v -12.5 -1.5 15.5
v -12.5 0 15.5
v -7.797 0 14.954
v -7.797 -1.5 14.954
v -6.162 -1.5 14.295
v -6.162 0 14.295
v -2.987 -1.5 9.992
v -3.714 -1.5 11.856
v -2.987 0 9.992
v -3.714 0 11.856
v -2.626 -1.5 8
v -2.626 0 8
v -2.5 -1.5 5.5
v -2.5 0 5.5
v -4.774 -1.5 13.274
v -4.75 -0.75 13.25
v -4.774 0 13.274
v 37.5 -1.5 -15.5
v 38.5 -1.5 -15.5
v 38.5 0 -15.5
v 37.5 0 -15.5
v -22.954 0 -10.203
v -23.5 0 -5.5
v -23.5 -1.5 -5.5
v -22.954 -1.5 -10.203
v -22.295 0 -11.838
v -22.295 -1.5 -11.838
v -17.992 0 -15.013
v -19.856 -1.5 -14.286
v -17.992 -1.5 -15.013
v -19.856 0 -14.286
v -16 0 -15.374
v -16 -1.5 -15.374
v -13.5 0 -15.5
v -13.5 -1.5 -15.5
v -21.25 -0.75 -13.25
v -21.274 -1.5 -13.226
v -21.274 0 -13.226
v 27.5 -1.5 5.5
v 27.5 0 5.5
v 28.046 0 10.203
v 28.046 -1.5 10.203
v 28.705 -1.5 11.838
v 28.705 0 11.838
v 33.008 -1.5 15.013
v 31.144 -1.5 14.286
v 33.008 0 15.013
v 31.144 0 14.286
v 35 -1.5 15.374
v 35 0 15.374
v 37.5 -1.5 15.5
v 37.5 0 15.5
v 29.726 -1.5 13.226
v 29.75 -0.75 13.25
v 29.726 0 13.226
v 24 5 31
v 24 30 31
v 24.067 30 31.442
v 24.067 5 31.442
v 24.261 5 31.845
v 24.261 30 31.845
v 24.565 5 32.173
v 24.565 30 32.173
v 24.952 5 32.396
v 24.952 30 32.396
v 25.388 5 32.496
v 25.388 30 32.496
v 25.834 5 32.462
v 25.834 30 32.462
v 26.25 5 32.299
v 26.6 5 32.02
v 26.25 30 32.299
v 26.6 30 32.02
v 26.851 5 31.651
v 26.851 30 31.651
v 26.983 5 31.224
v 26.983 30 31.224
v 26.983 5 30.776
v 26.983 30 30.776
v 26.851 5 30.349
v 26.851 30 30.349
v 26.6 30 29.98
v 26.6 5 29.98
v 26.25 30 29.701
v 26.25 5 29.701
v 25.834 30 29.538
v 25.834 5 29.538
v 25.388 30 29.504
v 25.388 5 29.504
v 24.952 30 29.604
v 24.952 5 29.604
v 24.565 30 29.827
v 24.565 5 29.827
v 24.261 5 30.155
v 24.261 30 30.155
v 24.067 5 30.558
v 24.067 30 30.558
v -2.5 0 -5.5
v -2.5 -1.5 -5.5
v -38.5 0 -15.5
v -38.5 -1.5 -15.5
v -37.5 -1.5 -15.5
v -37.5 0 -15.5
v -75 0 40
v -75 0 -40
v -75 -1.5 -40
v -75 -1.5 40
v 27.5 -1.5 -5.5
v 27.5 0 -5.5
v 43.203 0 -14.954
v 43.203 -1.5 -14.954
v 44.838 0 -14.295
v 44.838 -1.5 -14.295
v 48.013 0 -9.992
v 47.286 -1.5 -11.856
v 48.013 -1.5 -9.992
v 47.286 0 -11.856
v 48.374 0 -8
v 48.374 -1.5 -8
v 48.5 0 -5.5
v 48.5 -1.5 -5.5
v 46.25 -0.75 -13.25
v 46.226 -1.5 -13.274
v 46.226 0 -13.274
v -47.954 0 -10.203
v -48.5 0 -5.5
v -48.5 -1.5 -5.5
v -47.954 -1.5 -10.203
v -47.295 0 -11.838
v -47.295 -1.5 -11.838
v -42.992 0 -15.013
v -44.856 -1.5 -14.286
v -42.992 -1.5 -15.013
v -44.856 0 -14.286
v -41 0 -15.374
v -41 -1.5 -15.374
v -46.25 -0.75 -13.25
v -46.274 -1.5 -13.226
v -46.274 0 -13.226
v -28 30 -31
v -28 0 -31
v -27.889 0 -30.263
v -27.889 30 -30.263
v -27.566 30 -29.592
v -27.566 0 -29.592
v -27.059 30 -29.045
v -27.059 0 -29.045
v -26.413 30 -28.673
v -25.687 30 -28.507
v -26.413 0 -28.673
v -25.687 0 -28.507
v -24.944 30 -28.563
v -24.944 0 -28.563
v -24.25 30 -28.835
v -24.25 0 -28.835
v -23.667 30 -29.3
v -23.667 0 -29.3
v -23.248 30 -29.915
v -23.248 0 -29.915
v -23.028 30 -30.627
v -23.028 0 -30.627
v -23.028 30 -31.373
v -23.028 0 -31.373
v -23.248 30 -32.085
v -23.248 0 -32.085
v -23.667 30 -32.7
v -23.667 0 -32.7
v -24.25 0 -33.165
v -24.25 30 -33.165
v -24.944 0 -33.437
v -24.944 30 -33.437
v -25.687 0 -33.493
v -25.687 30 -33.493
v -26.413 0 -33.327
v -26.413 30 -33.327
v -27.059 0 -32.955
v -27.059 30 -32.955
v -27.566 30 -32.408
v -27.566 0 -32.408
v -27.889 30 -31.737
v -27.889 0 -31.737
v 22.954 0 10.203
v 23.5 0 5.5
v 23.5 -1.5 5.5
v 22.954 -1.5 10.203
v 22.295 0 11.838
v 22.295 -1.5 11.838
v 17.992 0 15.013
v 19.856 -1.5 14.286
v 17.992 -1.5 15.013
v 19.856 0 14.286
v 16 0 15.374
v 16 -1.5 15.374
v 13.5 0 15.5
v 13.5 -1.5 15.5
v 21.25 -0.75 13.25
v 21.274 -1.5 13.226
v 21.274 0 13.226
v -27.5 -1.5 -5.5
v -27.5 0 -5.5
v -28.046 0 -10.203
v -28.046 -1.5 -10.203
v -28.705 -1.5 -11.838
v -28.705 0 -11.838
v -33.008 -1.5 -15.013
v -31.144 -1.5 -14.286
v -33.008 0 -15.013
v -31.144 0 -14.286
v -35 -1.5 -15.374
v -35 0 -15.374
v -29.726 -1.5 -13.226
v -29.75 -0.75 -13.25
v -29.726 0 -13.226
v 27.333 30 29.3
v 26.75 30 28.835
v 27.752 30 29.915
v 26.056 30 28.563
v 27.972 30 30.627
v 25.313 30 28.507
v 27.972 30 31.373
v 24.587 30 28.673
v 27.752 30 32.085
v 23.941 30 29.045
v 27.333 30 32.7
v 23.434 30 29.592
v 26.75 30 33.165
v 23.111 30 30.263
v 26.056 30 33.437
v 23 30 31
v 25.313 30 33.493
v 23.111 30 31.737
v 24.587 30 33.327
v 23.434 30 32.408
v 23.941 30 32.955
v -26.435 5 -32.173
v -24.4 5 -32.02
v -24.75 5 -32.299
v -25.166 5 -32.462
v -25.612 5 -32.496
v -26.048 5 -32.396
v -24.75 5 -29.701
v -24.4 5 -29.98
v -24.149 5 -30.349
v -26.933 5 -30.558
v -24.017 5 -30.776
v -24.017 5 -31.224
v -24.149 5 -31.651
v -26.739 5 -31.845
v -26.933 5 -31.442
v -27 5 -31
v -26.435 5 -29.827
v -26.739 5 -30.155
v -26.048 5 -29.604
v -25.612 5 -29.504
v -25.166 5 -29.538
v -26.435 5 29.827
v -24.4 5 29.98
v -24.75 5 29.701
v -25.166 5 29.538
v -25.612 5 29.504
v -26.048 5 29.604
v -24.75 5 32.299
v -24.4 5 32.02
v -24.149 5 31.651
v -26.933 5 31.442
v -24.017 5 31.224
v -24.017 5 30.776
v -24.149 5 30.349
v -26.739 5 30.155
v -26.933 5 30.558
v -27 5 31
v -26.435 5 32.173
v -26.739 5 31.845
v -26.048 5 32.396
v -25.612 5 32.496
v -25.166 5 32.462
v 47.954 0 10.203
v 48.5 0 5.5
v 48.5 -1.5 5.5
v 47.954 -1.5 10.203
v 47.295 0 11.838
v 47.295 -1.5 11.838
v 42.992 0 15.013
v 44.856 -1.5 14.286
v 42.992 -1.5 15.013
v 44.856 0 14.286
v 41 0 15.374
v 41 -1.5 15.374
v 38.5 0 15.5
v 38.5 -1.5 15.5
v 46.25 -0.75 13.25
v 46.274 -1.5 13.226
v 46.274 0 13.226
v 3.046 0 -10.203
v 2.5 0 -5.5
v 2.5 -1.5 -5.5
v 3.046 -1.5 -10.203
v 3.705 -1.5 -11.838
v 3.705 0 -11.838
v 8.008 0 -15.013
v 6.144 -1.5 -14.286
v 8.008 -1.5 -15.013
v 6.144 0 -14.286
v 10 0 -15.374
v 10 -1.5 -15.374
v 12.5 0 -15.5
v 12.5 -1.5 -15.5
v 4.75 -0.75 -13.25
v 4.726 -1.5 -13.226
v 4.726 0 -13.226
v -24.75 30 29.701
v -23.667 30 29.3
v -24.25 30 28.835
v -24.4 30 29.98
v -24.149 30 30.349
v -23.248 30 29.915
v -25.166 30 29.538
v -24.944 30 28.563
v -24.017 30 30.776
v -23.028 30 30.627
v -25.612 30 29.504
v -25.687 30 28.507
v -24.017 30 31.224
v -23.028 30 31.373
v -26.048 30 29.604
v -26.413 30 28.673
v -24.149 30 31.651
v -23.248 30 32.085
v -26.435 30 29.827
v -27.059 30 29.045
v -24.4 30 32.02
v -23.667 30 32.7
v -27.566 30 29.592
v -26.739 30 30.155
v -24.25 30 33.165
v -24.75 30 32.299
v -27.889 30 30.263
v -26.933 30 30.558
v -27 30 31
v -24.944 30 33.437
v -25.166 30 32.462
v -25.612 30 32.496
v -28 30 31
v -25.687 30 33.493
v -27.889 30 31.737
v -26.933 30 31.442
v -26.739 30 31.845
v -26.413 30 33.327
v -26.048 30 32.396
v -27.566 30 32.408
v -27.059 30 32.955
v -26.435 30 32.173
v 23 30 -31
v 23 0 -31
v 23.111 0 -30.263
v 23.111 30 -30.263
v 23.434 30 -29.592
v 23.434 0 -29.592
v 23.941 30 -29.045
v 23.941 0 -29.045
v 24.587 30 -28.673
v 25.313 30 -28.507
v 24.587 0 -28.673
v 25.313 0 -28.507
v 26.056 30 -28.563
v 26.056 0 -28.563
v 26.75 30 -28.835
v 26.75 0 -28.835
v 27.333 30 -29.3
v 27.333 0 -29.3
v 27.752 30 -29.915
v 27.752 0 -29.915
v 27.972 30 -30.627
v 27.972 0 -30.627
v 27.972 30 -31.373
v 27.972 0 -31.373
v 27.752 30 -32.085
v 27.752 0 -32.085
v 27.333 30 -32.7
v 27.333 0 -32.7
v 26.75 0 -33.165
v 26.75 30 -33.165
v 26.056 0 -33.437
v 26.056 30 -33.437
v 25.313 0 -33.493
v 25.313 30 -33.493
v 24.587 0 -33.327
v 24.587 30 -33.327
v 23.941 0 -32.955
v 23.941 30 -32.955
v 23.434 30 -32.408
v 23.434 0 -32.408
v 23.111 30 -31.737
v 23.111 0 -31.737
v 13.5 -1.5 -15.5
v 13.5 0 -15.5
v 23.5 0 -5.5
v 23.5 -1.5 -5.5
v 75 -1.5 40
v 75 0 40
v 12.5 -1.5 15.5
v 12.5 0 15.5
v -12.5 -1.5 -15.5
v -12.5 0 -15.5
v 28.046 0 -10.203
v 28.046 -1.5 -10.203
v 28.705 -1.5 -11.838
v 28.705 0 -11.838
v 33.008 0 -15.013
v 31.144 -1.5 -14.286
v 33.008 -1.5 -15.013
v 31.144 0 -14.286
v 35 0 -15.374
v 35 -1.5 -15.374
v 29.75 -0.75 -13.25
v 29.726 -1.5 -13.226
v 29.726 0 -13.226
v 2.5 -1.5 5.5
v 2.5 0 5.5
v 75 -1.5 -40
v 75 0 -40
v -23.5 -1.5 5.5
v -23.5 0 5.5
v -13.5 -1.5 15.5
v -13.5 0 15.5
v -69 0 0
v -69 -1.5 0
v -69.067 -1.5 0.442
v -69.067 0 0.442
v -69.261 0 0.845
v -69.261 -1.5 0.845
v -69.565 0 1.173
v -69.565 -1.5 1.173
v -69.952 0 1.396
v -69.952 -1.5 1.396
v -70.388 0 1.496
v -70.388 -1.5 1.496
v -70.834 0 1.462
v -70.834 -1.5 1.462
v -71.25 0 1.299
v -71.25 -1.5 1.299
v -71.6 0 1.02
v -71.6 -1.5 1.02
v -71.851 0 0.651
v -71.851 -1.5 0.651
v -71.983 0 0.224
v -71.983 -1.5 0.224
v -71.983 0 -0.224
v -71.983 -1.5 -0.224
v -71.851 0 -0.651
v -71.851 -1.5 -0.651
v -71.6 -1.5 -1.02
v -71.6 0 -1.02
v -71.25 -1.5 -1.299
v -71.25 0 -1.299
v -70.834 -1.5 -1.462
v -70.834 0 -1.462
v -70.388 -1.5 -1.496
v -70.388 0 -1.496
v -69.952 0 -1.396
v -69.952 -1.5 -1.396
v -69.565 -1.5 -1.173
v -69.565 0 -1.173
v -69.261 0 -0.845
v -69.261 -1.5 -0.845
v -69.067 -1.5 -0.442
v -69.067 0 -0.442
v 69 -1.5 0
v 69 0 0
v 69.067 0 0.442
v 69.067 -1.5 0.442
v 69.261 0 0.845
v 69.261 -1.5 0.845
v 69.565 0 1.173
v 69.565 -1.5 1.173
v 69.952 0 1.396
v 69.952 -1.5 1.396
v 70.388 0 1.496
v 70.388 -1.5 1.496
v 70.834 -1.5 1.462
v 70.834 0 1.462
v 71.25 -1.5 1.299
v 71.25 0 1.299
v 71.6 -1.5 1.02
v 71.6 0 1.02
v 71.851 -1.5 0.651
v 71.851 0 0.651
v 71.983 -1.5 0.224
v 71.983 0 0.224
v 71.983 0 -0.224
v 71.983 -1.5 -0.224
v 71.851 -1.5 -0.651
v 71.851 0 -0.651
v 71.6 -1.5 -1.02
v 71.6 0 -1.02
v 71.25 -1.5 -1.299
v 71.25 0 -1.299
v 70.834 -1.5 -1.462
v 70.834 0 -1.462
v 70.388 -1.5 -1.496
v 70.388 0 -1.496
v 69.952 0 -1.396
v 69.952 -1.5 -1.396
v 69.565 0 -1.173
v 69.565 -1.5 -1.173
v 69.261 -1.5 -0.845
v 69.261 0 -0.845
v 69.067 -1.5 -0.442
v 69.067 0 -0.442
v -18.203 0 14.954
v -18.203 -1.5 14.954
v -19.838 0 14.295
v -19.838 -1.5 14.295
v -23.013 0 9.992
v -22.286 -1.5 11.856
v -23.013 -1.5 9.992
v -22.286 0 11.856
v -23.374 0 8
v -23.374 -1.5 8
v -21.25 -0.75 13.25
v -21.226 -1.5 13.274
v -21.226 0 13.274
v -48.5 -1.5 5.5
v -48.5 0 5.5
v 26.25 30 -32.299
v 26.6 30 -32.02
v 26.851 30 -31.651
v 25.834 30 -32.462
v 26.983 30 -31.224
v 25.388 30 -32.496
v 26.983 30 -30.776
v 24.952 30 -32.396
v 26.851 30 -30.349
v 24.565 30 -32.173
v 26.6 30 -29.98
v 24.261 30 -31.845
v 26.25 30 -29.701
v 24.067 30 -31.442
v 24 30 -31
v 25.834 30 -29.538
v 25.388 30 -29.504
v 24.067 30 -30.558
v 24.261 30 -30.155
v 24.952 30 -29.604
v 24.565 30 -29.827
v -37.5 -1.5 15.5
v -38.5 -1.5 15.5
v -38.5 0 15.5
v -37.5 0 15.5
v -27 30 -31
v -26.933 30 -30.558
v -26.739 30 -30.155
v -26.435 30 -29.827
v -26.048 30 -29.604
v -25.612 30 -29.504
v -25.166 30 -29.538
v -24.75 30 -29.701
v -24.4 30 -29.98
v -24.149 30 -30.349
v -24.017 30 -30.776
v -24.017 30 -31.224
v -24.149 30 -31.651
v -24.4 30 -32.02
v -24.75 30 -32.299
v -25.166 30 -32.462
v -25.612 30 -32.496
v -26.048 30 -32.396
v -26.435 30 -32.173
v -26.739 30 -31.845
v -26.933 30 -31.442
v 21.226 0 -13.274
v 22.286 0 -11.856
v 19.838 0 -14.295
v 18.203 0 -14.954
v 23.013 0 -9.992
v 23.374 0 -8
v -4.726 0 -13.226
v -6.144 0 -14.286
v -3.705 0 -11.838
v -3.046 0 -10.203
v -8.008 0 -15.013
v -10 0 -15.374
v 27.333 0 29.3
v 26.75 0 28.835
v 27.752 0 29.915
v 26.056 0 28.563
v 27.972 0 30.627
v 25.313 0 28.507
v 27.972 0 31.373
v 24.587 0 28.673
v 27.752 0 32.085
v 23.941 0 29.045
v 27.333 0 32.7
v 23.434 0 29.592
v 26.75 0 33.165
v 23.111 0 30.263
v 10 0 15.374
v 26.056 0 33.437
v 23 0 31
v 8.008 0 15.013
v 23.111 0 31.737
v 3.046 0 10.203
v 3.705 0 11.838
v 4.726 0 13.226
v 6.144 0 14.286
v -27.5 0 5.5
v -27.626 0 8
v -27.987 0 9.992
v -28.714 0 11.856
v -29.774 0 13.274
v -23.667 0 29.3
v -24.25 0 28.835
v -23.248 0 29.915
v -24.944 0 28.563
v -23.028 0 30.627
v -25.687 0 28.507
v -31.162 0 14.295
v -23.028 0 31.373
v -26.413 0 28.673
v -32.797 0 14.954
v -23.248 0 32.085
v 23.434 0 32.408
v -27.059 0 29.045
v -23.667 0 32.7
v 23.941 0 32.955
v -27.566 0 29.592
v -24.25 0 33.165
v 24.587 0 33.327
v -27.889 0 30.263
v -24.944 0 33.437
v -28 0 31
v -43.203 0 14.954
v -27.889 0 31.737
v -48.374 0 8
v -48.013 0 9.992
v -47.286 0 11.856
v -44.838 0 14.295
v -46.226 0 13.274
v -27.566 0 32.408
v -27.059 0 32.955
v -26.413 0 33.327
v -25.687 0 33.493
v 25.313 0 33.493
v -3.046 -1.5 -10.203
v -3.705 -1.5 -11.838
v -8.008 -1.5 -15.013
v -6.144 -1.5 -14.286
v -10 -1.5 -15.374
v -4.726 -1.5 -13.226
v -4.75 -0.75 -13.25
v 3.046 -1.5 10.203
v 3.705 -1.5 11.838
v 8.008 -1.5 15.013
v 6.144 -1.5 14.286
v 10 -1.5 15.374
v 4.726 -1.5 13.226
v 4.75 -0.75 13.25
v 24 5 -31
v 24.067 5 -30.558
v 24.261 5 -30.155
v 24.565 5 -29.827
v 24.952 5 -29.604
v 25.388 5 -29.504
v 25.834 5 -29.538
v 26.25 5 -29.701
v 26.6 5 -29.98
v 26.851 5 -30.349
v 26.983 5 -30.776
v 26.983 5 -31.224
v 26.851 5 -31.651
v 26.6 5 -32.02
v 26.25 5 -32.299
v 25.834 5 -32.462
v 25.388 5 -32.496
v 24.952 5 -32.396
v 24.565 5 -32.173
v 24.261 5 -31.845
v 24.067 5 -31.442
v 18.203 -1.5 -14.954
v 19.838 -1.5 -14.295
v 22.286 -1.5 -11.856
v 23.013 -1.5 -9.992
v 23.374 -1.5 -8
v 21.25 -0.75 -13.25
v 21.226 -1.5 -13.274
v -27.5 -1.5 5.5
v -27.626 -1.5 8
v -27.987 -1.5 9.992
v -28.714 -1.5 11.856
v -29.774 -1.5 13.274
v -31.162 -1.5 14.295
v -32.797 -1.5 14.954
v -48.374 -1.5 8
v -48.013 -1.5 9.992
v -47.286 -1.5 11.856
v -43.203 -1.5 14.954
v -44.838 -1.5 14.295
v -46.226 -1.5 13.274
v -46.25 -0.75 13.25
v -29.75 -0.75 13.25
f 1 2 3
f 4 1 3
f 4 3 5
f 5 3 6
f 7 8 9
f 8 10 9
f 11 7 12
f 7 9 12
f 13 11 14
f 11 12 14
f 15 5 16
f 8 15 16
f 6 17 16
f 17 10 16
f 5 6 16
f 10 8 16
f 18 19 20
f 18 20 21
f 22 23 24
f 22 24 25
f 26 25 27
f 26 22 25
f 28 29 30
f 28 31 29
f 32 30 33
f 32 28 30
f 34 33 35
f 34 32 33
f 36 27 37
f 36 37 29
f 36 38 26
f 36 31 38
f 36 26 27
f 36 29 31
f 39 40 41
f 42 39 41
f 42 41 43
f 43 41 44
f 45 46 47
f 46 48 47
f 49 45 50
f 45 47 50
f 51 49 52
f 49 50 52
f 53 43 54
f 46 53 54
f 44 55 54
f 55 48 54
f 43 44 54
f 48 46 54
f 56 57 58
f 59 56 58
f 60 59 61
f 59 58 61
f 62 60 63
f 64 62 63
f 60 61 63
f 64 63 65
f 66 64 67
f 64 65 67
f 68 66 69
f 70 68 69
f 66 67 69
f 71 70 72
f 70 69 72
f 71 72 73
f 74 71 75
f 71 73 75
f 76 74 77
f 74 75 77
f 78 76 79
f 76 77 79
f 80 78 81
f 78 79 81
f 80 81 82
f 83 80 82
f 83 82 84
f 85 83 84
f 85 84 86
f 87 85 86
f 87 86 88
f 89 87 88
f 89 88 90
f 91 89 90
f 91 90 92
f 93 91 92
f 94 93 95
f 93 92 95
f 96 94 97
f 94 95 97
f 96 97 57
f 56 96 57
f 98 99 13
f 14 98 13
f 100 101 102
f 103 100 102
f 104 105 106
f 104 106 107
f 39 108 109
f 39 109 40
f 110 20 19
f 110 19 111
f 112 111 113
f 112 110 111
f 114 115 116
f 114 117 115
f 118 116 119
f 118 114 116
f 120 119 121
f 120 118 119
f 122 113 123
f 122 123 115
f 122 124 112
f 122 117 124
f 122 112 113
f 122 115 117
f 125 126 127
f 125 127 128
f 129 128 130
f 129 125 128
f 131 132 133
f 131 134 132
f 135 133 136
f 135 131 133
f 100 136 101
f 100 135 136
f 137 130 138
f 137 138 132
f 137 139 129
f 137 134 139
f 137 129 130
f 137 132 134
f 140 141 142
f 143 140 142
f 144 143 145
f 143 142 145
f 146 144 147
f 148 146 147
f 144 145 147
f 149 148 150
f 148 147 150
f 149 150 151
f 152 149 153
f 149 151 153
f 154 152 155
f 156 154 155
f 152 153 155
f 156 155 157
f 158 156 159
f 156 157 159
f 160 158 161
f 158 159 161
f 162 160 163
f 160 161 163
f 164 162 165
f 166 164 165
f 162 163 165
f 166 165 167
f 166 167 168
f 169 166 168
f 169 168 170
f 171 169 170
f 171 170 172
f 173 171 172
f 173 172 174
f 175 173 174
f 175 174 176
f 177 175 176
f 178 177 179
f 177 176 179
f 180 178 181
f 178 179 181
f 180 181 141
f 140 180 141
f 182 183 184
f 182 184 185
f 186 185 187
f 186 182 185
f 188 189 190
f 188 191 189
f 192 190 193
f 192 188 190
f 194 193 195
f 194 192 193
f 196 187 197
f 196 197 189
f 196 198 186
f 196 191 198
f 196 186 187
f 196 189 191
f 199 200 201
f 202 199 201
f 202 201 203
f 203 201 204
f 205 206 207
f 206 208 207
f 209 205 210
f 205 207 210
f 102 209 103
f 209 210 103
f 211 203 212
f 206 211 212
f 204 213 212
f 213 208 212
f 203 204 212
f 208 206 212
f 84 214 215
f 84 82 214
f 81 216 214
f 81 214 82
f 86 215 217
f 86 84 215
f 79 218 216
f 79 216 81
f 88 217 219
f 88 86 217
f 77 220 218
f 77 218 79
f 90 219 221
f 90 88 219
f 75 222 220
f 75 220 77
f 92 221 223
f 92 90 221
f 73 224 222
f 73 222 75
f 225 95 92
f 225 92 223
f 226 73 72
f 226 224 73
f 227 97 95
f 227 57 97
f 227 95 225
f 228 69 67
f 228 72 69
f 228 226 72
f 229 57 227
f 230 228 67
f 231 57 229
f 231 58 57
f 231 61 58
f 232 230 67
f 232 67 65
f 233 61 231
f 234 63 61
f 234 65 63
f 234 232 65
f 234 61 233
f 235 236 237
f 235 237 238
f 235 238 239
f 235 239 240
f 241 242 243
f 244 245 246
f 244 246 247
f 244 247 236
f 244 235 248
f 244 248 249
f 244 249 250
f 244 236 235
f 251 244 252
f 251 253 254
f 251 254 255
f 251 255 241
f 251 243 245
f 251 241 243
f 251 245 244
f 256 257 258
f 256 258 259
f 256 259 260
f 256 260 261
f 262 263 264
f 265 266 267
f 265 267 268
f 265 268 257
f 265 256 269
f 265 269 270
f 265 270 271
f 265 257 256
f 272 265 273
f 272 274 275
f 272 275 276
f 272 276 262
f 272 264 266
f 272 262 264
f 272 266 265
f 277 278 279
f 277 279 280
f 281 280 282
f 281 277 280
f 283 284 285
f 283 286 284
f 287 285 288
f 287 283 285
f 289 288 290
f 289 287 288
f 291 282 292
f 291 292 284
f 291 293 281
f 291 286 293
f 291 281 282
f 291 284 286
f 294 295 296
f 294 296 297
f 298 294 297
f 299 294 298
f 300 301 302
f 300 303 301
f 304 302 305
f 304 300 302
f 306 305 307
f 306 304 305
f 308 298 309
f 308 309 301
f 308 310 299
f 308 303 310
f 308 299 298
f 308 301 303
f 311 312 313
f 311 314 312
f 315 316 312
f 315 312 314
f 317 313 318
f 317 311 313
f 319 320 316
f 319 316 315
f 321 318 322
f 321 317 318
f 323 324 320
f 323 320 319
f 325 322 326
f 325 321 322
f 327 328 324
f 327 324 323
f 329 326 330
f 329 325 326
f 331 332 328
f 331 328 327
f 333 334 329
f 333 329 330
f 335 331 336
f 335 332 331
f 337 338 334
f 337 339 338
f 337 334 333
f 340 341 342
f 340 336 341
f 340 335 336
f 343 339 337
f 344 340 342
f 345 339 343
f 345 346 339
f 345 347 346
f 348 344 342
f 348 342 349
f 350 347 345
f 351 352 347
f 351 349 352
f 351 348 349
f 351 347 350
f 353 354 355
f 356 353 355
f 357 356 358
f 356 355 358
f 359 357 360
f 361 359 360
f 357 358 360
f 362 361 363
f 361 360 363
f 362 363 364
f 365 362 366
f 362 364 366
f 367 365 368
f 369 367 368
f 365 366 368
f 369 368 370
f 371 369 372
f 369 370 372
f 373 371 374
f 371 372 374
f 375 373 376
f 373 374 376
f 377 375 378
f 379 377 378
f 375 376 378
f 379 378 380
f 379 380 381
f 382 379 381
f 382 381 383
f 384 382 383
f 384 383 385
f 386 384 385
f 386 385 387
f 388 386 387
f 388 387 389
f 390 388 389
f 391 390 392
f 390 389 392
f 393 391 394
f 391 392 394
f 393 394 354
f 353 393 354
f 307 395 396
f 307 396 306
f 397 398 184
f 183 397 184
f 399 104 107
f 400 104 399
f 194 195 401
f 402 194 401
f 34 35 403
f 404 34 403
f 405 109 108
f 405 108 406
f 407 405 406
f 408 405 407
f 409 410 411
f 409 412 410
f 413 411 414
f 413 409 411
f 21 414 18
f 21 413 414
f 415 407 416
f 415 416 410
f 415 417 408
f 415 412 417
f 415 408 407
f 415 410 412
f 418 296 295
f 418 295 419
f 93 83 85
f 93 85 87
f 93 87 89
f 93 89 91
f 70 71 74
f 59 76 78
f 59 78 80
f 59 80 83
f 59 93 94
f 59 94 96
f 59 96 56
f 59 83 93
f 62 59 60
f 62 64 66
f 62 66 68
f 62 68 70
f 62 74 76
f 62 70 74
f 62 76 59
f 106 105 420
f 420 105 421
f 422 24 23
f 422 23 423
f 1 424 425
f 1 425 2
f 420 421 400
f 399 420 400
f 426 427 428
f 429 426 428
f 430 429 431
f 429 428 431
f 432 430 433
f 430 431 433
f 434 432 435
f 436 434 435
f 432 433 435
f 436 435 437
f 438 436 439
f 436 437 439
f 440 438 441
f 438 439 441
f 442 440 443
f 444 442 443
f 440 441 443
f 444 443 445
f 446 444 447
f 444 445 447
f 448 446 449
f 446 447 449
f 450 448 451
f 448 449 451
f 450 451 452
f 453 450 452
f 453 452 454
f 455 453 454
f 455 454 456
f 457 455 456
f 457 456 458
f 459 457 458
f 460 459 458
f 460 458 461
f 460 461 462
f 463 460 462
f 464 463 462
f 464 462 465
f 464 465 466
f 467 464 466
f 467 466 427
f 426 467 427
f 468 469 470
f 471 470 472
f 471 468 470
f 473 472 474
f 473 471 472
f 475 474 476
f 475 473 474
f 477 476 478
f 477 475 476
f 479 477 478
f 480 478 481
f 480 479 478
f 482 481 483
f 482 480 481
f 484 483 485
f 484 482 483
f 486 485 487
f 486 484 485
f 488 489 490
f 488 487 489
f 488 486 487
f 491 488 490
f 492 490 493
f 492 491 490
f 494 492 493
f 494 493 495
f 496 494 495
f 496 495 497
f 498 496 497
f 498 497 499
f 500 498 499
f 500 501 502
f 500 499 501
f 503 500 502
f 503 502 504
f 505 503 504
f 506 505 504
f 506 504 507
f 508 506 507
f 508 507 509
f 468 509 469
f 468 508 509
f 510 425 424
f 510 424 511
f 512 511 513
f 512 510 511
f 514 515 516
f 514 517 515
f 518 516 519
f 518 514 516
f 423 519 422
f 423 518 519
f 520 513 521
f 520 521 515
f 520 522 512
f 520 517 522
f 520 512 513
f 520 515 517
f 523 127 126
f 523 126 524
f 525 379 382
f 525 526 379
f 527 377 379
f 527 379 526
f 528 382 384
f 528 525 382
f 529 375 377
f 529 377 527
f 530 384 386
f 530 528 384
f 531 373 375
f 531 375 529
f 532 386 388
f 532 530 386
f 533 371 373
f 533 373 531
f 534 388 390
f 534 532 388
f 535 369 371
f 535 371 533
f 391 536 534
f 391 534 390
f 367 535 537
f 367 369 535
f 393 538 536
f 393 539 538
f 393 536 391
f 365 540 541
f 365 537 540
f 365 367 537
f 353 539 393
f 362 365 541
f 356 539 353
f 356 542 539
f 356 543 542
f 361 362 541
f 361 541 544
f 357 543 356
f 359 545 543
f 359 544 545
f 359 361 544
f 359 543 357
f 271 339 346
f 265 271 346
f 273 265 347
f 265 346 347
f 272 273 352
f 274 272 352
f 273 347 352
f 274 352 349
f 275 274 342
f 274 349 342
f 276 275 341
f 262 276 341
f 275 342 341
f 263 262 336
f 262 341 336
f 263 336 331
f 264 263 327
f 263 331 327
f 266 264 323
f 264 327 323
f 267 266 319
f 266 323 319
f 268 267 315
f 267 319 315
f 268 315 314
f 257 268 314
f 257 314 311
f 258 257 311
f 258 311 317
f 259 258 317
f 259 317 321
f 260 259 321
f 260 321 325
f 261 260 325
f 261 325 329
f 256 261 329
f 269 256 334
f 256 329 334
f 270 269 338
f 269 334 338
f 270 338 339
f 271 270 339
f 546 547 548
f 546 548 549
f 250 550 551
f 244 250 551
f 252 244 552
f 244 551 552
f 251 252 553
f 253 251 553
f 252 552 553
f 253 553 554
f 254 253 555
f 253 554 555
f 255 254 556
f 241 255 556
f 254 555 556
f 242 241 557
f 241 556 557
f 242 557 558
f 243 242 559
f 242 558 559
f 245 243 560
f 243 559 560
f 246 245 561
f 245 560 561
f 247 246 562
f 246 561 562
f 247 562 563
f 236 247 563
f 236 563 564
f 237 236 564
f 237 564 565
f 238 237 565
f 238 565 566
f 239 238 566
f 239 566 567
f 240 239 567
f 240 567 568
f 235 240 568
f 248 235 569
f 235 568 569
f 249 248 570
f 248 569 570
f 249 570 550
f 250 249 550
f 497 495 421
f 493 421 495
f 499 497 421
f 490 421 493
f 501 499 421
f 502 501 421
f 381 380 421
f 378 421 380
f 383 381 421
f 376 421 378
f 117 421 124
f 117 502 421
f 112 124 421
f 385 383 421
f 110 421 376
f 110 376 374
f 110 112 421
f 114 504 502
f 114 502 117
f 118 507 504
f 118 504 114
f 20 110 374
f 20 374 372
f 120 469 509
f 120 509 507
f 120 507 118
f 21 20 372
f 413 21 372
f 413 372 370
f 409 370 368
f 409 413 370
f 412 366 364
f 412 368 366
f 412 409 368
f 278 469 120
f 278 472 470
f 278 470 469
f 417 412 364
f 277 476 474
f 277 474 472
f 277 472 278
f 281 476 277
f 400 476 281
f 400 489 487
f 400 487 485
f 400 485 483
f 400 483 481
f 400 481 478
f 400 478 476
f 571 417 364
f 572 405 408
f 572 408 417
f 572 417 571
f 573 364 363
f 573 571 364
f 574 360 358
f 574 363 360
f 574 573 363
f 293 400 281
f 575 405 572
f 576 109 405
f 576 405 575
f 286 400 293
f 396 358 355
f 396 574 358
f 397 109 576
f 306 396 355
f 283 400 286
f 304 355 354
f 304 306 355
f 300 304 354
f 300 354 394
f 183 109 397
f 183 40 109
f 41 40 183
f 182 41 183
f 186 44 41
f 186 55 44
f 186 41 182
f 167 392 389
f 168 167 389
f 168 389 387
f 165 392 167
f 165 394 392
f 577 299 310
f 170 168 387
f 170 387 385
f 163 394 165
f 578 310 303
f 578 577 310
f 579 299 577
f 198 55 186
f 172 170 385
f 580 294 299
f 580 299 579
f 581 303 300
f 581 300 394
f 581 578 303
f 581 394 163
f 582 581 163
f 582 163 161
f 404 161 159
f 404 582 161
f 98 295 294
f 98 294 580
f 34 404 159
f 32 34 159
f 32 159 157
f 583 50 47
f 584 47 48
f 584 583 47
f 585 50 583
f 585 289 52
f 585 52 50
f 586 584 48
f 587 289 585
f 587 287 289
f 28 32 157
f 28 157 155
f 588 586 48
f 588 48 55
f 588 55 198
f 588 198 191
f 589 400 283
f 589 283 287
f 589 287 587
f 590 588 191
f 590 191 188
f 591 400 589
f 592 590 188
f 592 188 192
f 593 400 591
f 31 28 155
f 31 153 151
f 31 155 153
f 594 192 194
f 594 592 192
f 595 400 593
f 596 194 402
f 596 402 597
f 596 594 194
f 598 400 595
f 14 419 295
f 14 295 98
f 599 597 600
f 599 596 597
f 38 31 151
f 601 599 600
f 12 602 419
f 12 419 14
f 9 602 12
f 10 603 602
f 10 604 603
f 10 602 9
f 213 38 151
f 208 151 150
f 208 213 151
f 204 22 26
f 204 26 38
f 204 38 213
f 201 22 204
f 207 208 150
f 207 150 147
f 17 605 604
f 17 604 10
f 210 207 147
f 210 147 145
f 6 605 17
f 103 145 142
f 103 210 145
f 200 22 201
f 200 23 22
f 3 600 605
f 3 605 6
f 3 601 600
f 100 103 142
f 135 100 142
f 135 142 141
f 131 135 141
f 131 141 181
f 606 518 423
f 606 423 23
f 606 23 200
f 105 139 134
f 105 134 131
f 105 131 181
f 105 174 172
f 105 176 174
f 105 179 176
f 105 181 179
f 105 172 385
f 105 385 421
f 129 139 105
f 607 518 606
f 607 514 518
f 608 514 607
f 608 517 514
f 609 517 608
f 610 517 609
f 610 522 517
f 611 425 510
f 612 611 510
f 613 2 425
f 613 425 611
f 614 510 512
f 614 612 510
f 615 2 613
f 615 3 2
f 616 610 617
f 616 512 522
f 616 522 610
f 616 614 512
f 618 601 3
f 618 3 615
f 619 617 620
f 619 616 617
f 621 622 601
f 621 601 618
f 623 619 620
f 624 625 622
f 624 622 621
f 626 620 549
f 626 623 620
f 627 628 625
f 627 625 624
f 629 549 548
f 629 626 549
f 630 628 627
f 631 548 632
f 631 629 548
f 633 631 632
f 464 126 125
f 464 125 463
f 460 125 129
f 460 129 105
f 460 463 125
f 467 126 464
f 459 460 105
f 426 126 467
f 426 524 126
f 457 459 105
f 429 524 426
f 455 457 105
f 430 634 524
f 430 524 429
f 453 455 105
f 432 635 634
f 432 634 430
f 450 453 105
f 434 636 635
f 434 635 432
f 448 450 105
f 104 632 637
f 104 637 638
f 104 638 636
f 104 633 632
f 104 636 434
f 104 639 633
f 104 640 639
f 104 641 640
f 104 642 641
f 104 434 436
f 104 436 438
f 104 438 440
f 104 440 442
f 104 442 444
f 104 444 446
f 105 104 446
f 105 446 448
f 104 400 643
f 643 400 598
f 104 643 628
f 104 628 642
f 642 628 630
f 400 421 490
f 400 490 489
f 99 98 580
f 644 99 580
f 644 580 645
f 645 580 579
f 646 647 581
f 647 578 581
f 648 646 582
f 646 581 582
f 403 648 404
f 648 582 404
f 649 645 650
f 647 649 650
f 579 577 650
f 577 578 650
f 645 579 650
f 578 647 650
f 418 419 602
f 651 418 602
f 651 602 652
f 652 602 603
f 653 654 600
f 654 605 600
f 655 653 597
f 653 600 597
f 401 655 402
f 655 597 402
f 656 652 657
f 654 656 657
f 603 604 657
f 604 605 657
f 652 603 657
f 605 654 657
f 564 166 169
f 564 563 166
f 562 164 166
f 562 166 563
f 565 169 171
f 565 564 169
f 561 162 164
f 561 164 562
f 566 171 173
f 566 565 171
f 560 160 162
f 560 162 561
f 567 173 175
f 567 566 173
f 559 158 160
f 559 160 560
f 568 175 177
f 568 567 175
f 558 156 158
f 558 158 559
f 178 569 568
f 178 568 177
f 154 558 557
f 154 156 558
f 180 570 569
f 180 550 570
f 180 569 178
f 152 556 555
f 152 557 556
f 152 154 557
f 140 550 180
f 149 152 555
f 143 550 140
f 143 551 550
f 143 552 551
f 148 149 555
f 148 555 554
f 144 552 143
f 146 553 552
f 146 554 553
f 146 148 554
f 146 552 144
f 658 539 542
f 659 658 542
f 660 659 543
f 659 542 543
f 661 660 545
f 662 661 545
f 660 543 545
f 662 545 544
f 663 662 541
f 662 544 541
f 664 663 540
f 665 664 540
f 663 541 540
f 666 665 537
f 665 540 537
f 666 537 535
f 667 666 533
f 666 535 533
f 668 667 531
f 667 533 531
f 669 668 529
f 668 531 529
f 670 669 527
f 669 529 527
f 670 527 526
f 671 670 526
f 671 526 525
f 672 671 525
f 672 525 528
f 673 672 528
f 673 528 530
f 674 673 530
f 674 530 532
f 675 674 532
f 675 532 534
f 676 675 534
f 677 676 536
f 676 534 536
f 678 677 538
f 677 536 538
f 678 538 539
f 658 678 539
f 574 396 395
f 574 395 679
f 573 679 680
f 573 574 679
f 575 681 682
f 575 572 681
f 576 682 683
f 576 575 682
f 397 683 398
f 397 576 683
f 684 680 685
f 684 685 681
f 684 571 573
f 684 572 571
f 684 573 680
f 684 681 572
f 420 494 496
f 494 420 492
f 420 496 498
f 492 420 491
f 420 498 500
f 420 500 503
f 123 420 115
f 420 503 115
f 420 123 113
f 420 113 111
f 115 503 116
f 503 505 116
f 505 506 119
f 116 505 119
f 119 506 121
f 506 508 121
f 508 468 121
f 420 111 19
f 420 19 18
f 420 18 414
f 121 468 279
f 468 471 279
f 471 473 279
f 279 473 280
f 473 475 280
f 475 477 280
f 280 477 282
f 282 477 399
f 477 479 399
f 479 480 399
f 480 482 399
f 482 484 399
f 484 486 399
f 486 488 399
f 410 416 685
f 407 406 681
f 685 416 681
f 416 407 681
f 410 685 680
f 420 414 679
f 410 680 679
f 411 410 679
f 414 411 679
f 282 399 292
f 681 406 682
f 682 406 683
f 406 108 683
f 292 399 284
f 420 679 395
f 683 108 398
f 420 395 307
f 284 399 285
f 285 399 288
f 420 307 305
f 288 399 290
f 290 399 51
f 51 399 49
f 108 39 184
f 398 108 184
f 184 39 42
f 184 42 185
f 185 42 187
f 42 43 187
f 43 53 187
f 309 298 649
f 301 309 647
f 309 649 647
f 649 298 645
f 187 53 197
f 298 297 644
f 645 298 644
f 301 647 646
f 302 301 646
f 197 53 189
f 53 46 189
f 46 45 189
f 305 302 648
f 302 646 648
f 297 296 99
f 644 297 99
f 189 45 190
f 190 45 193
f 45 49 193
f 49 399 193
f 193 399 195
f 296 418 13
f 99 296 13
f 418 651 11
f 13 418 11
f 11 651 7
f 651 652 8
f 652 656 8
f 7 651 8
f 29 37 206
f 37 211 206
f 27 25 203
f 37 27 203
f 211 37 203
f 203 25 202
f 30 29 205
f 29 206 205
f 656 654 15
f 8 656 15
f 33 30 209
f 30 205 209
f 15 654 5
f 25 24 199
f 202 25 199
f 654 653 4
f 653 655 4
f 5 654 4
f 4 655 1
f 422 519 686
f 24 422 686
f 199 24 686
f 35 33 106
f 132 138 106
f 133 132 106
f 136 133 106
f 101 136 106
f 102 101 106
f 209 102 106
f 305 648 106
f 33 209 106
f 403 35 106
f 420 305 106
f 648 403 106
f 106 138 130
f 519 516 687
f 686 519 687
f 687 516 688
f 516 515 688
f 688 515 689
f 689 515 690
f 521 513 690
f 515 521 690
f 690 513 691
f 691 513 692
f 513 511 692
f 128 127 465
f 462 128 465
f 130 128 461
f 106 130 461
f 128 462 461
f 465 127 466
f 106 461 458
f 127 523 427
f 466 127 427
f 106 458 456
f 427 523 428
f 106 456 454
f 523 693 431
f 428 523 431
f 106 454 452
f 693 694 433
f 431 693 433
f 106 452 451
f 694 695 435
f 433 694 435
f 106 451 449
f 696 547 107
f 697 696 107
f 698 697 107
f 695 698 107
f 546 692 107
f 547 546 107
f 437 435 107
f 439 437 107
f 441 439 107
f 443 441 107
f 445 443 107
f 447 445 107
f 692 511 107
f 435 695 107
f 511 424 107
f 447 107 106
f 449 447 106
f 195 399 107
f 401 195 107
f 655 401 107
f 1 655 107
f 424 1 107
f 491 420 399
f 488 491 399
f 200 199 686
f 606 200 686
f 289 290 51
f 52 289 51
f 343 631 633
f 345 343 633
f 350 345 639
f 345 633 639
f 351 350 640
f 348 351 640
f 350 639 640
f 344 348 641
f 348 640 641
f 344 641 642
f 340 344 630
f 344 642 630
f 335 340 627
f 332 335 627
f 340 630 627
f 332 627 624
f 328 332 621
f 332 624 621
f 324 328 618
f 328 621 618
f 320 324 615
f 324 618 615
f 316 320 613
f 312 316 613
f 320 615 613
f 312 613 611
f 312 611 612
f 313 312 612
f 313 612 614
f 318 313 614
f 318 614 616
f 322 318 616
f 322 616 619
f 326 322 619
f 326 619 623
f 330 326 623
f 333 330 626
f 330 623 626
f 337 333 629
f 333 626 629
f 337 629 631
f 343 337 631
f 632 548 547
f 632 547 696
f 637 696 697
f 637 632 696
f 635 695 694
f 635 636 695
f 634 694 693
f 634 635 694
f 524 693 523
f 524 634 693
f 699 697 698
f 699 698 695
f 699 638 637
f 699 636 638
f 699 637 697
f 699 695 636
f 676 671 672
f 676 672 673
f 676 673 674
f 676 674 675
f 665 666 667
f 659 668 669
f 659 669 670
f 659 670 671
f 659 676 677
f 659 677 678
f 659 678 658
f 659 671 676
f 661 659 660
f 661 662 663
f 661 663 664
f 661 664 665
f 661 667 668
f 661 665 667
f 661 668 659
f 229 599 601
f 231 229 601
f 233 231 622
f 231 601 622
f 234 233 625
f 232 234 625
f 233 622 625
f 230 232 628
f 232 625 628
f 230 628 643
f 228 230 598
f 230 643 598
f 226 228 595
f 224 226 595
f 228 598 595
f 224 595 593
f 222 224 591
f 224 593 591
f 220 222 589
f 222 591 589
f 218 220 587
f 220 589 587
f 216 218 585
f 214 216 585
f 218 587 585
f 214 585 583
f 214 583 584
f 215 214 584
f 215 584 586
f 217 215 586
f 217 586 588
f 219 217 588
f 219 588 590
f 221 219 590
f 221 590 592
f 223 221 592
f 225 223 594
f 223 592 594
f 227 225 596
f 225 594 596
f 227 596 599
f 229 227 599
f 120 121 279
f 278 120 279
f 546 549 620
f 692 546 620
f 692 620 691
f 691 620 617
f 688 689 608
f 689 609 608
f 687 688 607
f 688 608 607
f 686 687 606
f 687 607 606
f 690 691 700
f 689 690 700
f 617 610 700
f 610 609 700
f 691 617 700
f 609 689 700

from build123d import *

# Parameters (mm, degrees)
F0_W         = 150
F0_H         = 80
F1_DEPTH     = 1.5
F2_R         = 2.5
F3_DEPTH     = 30
F4_R         = 1.5
F5_R         = 1.5
F6_R         = 1.5
F7_R         = 1.5
F8_DEPTH     = 25
F9_R         = 1.5
F9_W         = 21
F9_H         = 31
F10_DEPTH    = 3
F12_T1_DEPTH = 1.5


# Not quite as in the source:
# - a fillet or chamfer that OpenCascade refuses, or shapes differently, is made with other operations: its cross-section is extruded or revolved along the edge and cut away or added


with BuildPart() as f1:
    # F0 (on Front) → F1 (new body)
    with BuildSketch(Plane.XZ):
        Rectangle(F0_W, F0_H)
    extrude(amount=F1_DEPTH)

    # F2 (on face) → F3 (join)
    with BuildSketch(Plane(origin=(0, 0, 0), x_dir=(-1, 0, 0), z_dir=(0, 1, 0))):
        with Locations((-25.5, 31)):
            Circle(F2_R)
        with Locations((-25.5, -31)):
            Circle(F2_R)
        with Locations((25.5, -31)):
            Circle(F2_R)
        with Locations((25.5, 31)):
            Circle(F2_R)
    extrude(amount=F3_DEPTH)

    # F4 (on face) + F5 (on face) + F6 (on face) + F7 (on face) → F8 (cut)
    with BuildSketch(Plane(origin=(0, 30, 0), x_dir=(-1, 0, 0), z_dir=(0, 1, 0))):
        with Locations((-25.5, 31)):
            Circle(F4_R)
    with BuildSketch(Plane(origin=(0, 30, 0), x_dir=(-1, 0, 0), z_dir=(0, 1, 0))):
        with Locations((25.5, 31)):
            Circle(F5_R)
    with BuildSketch(Plane(origin=(0, 30, 0), x_dir=(-1, 0, 0), z_dir=(0, 1, 0))):
        with Locations((-25.5, -31)):
            Circle(F6_R)
    with BuildSketch(Plane(origin=(0, 30, 0), x_dir=(-1, 0, 0), z_dir=(0, 1, 0))):
        with Locations((25.5, -31)):
            Circle(F7_R)
    extrude(amount=-F8_DEPTH, mode=Mode.SUBTRACT)

    # F9 (on face) → F10 (cut)
    with BuildSketch(Plane.XZ.offset(1.5)):
        with Locations((-70.5, 0)):
            Circle(F9_R)
        with Locations((-38, 0)):
            Rectangle(F9_W, F9_H)
        with Locations((-13, 0)):
            Rectangle(F9_W, F9_H)
    f10 = extrude(amount=-F10_DEPTH, mode=Mode.SUBTRACT)

    # F11: F10 across plane
    add(f10.mirror(Plane.YZ), mode=Mode.SUBTRACT)

    # F12: fillet of radius 10 on 16 edges, made by hand

    # F12_s2 → F12_t1 (join)
    with BuildSketch(Plane.XZ):
        with BuildLine():
            add(Edge.make_bspline(
                [(-38.5, 15.5), (-48.5, 15.5), (-48.5, 5.5)],
                knots=[0, 0, 0, 1, 1, 1], degree=2, weights=[1, 1.2222222222, 1]))
            Line((-48.5, 5.5), (-48.5, 15.5))
            Line((-48.5, 15.5), (-38.5, 15.5))
        make_face()
        with BuildLine():
            add(Edge.make_bspline(
                [(-37.5, 15.5), (-27.5, 15.5), (-27.5, 5.5)],
                knots=[0, 0, 0, 1, 1, 1], degree=2, weights=[1, 1.2222222222, 1]))
            Line((-27.5, 5.5), (-27.5, 15.5))
            Line((-27.5, 15.5), (-37.5, 15.5))
        make_face()
        with BuildLine():
            add(Edge.make_bspline(
                [(-48.5, -5.5), (-48.5, -15.5), (-38.5, -15.5)],
                knots=[0, 0, 0, 1, 1, 1], degree=2, weights=[1, 1.2222222222, 1]))
            Line((-38.5, -15.5), (-48.5, -15.5))
            Line((-48.5, -15.5), (-48.5, -5.5))
        make_face()
        with BuildLine():
            add(Edge.make_bspline(
                [(-27.5, -5.5), (-27.5, -15.5), (-37.5, -15.5)],
                knots=[0, 0, 0, 1, 1, 1], degree=2, weights=[1, 1.2222222222, 1]))
            Line((-37.5, -15.5), (-27.5, -15.5))
            Line((-27.5, -15.5), (-27.5, -5.5))
        make_face()
        with BuildLine():
            add(Edge.make_bspline(
                [(-2.5, -5.5), (-2.5, -15.5), (-12.5, -15.5)],
                knots=[0, 0, 0, 1, 1, 1], degree=2, weights=[1, 1.2222222222, 1]))
            Line((-12.5, -15.5), (-2.5, -15.5))
            Line((-2.5, -15.5), (-2.5, -5.5))
        make_face()
        with BuildLine():
            add(Edge.make_bspline(
                [(-13.5, 15.5), (-23.5, 15.5), (-23.5, 5.5)],
                knots=[0, 0, 0, 1, 1, 1], degree=2, weights=[1, 1.2222222222, 1]))
            Line((-23.5, 5.5), (-23.5, 15.5))
            Line((-23.5, 15.5), (-13.5, 15.5))
        make_face()
        with BuildLine():
            add(Edge.make_bspline(
                [(-23.5, -5.5), (-23.5, -15.5), (-13.5, -15.5)],
                knots=[0, 0, 0, 1, 1, 1], degree=2, weights=[1, 1.2222222222, 1]))
            Line((-13.5, -15.5), (-23.5, -15.5))
            Line((-23.5, -15.5), (-23.5, -5.5))
        make_face()
        with BuildLine():
            add(Edge.make_bspline(
                [(-12.5, 15.5), (-2.5, 15.5), (-2.5, 5.5)],
                knots=[0, 0, 0, 1, 1, 1], degree=2, weights=[1, 1.2222222222, 1]))
            Line((-2.5, 5.5), (-2.5, 15.5))
            Line((-2.5, 15.5), (-12.5, 15.5))
        make_face()
        with BuildLine():
            add(Edge.make_bspline(
                [(23.5, 5.5), (23.5, 15.5), (13.5, 15.5)],
                knots=[0, 0, 0, 1, 1, 1], degree=2, weights=[1, 1.2222222222, 1]))
            Line((13.5, 15.5), (23.5, 15.5))
            Line((23.5, 15.5), (23.5, 5.5))
        make_face()
        with BuildLine():
            add(Edge.make_bspline(
                [(48.5, 5.5), (48.5, 15.5), (38.5, 15.5)],
                knots=[0, 0, 0, 1, 1, 1], degree=2, weights=[1, 1.2222222222, 1]))
            Line((38.5, 15.5), (48.5, 15.5))
            Line((48.5, 15.5), (48.5, 5.5))
        make_face()
        with BuildLine():
            add(Edge.make_bspline(
                [(2.5, -5.5), (2.5, -15.5), (12.5, -15.5)],
                knots=[0, 0, 0, 1, 1, 1], degree=2, weights=[1, 1.2222222222, 1]))
            Line((12.5, -15.5), (2.5, -15.5))
            Line((2.5, -15.5), (2.5, -5.5))
        make_face()
        with BuildLine():
            add(Edge.make_bspline(
                [(27.5, -5.5), (27.5, -15.5), (37.5, -15.5)],
                knots=[0, 0, 0, 1, 1, 1], degree=2, weights=[1, 1.2222222222, 1]))
            Line((37.5, -15.5), (27.5, -15.5))
            Line((27.5, -15.5), (27.5, -5.5))
        make_face()
        with BuildLine():
            add(Edge.make_bspline(
                [(27.5, 5.5), (27.5, 15.5), (37.5, 15.5)],
                knots=[0, 0, 0, 1, 1, 1], degree=2, weights=[1, 1.2222222222, 1]))
            Line((37.5, 15.5), (27.5, 15.5))
            Line((27.5, 15.5), (27.5, 5.5))
        make_face()
        with BuildLine():
            add(Edge.make_bspline(
                [(2.5, 5.5), (2.5, 15.5), (12.5, 15.5)],
                knots=[0, 0, 0, 1, 1, 1], degree=2, weights=[1, 1.2222222222, 1]))
            Line((12.5, 15.5), (2.5, 15.5))
            Line((2.5, 15.5), (2.5, 5.5))
        make_face()
        with BuildLine():
            add(Edge.make_bspline(
                [(38.5, -15.5), (48.5, -15.5), (48.5, -5.5)],
                knots=[0, 0, 0, 1, 1, 1], degree=2, weights=[1, 1.2222222222, 1]))
            Line((48.5, -5.5), (48.5, -15.5))
            Line((48.5, -15.5), (38.5, -15.5))
        make_face()
        with BuildLine():
            add(Edge.make_bspline(
                [(13.5, -15.5), (23.5, -15.5), (23.5, -5.5)],
                knots=[0, 0, 0, 1, 1, 1], degree=2, weights=[1, 1.2222222222, 1]))
            Line((23.5, -5.5), (23.5, -15.5))
            Line((23.5, -15.5), (13.5, -15.5))
        make_face()
    extrude(amount=F12_T1_DEPTH)


solid = f1.part
